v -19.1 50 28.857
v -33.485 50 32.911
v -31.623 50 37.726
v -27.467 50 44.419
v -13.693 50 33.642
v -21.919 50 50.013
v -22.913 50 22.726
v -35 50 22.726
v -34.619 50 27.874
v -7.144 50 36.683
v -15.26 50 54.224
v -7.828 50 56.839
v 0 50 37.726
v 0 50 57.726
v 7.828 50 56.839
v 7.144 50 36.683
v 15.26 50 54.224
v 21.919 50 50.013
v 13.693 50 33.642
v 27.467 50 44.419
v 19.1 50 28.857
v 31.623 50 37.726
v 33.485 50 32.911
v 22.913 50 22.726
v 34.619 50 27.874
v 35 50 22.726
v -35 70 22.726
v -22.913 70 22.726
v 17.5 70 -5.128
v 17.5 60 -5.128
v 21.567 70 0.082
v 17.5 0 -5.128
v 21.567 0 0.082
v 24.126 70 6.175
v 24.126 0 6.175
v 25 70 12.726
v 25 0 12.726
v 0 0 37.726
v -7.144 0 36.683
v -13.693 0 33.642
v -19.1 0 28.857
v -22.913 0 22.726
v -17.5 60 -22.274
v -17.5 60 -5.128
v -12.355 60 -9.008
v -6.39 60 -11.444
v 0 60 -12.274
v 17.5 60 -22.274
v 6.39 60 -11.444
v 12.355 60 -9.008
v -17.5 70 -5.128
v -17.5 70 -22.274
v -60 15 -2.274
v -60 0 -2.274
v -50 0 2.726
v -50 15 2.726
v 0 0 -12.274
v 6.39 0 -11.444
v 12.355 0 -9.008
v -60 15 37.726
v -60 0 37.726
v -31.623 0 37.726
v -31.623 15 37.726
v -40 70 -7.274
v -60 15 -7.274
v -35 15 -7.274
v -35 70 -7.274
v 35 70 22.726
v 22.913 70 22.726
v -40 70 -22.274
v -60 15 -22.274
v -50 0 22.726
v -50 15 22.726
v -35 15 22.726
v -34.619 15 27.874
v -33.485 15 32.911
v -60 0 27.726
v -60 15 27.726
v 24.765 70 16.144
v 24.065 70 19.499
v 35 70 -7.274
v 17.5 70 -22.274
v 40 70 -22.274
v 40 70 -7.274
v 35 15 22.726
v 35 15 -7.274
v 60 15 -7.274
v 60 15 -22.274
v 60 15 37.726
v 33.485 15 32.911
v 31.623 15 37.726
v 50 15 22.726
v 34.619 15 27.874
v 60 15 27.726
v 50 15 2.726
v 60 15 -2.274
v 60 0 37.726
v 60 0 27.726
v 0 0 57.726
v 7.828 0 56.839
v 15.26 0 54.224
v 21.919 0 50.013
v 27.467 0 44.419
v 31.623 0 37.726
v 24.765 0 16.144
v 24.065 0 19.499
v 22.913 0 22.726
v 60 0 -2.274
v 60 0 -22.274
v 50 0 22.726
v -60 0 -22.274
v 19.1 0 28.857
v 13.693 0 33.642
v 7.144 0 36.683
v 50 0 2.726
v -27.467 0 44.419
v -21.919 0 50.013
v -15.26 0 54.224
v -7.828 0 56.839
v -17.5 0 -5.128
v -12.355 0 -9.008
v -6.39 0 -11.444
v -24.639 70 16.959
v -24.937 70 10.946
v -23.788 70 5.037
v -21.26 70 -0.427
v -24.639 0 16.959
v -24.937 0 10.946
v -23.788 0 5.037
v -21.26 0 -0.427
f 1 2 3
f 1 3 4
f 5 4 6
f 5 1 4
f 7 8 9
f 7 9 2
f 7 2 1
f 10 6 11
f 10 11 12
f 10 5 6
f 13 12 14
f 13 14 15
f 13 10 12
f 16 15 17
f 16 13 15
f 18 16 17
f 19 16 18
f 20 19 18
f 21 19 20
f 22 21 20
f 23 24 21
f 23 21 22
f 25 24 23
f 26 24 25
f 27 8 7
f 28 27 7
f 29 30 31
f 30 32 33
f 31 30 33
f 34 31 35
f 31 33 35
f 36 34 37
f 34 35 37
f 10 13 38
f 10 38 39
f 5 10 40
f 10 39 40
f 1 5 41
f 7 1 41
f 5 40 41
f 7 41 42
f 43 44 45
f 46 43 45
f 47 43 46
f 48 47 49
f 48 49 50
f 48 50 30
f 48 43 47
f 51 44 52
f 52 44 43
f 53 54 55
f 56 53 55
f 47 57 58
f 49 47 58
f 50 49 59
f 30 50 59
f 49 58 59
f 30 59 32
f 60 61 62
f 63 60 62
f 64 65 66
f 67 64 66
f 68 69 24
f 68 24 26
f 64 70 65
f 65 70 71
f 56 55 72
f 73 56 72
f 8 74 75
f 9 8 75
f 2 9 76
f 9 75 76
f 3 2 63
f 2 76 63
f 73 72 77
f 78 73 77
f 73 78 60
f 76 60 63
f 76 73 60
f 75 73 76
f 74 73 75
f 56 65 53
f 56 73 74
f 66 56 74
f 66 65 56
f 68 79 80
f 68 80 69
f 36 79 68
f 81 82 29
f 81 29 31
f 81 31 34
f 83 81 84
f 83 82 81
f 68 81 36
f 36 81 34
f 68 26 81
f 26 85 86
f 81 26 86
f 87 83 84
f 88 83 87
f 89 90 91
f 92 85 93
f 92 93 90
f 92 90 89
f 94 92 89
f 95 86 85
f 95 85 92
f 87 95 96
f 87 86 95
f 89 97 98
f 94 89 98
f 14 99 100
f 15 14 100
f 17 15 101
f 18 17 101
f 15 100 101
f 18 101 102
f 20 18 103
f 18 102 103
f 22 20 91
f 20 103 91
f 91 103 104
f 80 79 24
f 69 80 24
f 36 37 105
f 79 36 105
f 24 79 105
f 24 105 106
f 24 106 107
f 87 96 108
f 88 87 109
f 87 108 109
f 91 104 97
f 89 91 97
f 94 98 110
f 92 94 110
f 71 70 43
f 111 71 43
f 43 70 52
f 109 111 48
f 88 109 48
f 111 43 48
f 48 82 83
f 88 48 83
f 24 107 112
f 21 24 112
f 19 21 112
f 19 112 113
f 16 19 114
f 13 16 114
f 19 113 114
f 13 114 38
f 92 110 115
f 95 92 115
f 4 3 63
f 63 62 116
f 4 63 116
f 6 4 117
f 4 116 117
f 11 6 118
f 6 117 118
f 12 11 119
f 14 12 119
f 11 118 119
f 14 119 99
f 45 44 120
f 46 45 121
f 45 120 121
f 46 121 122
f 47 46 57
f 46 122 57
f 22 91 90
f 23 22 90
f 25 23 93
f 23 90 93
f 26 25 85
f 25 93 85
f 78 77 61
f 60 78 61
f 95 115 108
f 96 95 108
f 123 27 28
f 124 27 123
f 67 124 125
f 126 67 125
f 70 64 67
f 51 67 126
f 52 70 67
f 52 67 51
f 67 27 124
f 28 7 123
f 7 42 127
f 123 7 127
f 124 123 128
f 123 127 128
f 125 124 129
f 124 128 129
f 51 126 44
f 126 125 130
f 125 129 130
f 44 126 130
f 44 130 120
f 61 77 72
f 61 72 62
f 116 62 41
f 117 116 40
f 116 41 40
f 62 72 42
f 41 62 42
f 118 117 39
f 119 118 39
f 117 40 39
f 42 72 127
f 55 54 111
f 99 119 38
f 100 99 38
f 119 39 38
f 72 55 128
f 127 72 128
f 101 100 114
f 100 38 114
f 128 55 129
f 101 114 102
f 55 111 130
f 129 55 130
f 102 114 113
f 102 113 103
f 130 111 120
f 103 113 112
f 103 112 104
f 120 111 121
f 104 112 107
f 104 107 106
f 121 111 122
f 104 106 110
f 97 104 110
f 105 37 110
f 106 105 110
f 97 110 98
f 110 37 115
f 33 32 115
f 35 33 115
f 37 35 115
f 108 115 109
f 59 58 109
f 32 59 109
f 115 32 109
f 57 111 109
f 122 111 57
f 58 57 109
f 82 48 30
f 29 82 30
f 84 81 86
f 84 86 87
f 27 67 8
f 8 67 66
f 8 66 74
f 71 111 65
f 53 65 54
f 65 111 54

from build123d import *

# Parameters (mm, degrees)
BOSS_EXTRUDE1_DEPTH   = 15
BOSS_EXTRUDE1_2_DEPTH = 15
BOSS_EXTRUDE2_DEPTH   = 50
BOSS_EXTRUDE3_DEPTH   = 70
BOSS_EXTRUDE4_DEPTH   = 60
BOSS_EXTRUDE5_DEPTH   = 15


with BuildPart() as part:
    # Sketch1 → Boss-Extrude1 (new body)
    with BuildSketch(Plane(origin=(0, 0, 0), x_dir=(1, 0, 0), z_dir=(0, 1, 0))):
        with BuildLine():
            ThreePointArc((-31.622776602, -37.725821986), (-34.145257219, -30.413566094), (-35, -22.725821986))
            Line((-35, -22.725821986), (-35, 7.274178014))
            Line((-35, 7.274178014), (-40, 7.274178014))
            Line((-40, 7.274178014), (-40, 22.274178014))
            Line((-40, 22.274178014), (-60, 22.274178014))
            Line((-60, 22.274178014), (-60, 2.274178014))
            Line((-60, 2.274178014), (-50, -2.725821986))
            Line((-50, -2.725821986), (-50, -22.725821986))
            Line((-50, -22.725821986), (-60, -27.725821986))
            Line((-60, -27.725821986), (-60, -37.725821986))
            Line((-60, -37.725821986), (-31.622776602, -37.725821986))
        make_face()
    extrude(amount=BOSS_EXTRUDE1_DEPTH)



with BuildPart() as body_2:
    # Sketch1 → Boss-Extrude1 2 (new body)
    with BuildSketch(Plane(origin=(0, 0, 0), x_dir=(1, 0, 0), z_dir=(0, 1, 0))):
        with BuildLine():
            ThreePointArc((35, -22.725821986), (34.145257219, -30.413566094), (31.622776602, -37.725821986))
            Line((31.622776602, -37.725821986), (60, -37.725821986))
            Line((60, -37.725821986), (60, -27.725821986))
            Line((60, -27.725821986), (50, -22.725821986))
            Line((50, -22.725821986), (50, -2.725821986))
            Line((50, -2.725821986), (60, 2.274178014))
            Line((60, 2.274178014), (60, 22.274178014))
            Line((60, 22.274178014), (40, 22.274178014))
            Line((40, 22.274178014), (40, 7.274178014))
            Line((40, 7.274178014), (35, 7.274178014))
            Line((35, 7.274178014), (35, -22.725821986))
        make_face()
    extrude(amount=BOSS_EXTRUDE1_2_DEPTH)


with BuildPart() as part_1:
    add(part.part)

    add(body_2.part)  # Boss-Extrude2 merges body 2
    # Sketch1<3> → Boss-Extrude2 (add)
    with BuildSketch(Plane(origin=(0, 0, 0), x_dir=(1, 0, 0), z_dir=(0, 1, 0))):
        with BuildLine():
            Line((-22.912878475, -22.725821986), (-35, -22.725821986))
            ThreePointArc((-35, -22.725821986), (0, -57.725821986), (35, -22.725821986))
            Line((35, -22.725821986), (22.912878475, -22.725821986))
            ThreePointArc((22.912878475, -22.725821986), (0, -37.725821986), (-22.912878475, -22.725821986))
        make_face()
    extrude(amount=BOSS_EXTRUDE2_DEPTH)

    # Sketch1<4> → Boss-Extrude3 (add)
    with BuildSketch(Plane(origin=(0, 0, 0), x_dir=(1, 0, 0), z_dir=(0, 1, 0))):
        with BuildLine():
            Line((-35, 7.274178014), (-35, -22.725821986))
            Line((-35, -22.725821986), (-22.912878475, -22.725821986))
            ThreePointArc((-22.912878475, -22.725821986), (-24.540895298, -7.956706975), (-17.5, 5.127749085))
            Line((-17.5, 5.127749085), (-17.5, 22.274178014))
            Line((-17.5, 22.274178014), (-40, 22.274178014))
            Line((-40, 22.274178014), (-40, 7.274178014))
            Line((-40, 7.274178014), (-35, 7.274178014))
        make_face()
        with BuildLine():
            ThreePointArc((17.5, 5.127749085), (24.540895298, -7.956706975), (22.912878475, -22.725821986))
            Line((22.912878475, -22.725821986), (35, -22.725821986))
            Line((35, -22.725821986), (35, 7.274178014))
            Line((35, 7.274178014), (40, 7.274178014))
            Line((40, 7.274178014), (40, 22.274178014))
            Line((40, 22.274178014), (17.5, 22.274178014))
            Line((17.5, 22.274178014), (17.5, 5.127749085))
        make_face()
    extrude(amount=BOSS_EXTRUDE3_DEPTH)

    # Sketch1<5> → Boss-Extrude4 (add)
    with BuildSketch(Plane(origin=(0, 0, 0), x_dir=(1, 0, 0), z_dir=(0, 1, 0))):
        with BuildLine():
            Line((-17.5, 22.274178014), (-17.5, 5.127749085))
            ThreePointArc((-17.5, 5.127749085), (0, 12.274178014), (17.5, 5.127749085))
            Line((17.5, 5.127749085), (17.5, 22.274178014))
            Line((17.5, 22.274178014), (-17.5, 22.274178014))
        make_face()
    extrude(amount=BOSS_EXTRUDE4_DEPTH)

    # Sketch3 → Boss-Extrude5 (add)
    with BuildSketch(Plane(origin=(0, 0, -22.274178014), x_dir=(-1, 0, 0), z_dir=(0, 0, -1))):
        Polygon((60, 15), (40, 15), (40, 70), align=None)
        Polygon((-60, 15), (-40, 15), (-40, 70), align=None)
    extrude(amount=-BOSS_EXTRUDE5_DEPTH)


solid = part_1.part
